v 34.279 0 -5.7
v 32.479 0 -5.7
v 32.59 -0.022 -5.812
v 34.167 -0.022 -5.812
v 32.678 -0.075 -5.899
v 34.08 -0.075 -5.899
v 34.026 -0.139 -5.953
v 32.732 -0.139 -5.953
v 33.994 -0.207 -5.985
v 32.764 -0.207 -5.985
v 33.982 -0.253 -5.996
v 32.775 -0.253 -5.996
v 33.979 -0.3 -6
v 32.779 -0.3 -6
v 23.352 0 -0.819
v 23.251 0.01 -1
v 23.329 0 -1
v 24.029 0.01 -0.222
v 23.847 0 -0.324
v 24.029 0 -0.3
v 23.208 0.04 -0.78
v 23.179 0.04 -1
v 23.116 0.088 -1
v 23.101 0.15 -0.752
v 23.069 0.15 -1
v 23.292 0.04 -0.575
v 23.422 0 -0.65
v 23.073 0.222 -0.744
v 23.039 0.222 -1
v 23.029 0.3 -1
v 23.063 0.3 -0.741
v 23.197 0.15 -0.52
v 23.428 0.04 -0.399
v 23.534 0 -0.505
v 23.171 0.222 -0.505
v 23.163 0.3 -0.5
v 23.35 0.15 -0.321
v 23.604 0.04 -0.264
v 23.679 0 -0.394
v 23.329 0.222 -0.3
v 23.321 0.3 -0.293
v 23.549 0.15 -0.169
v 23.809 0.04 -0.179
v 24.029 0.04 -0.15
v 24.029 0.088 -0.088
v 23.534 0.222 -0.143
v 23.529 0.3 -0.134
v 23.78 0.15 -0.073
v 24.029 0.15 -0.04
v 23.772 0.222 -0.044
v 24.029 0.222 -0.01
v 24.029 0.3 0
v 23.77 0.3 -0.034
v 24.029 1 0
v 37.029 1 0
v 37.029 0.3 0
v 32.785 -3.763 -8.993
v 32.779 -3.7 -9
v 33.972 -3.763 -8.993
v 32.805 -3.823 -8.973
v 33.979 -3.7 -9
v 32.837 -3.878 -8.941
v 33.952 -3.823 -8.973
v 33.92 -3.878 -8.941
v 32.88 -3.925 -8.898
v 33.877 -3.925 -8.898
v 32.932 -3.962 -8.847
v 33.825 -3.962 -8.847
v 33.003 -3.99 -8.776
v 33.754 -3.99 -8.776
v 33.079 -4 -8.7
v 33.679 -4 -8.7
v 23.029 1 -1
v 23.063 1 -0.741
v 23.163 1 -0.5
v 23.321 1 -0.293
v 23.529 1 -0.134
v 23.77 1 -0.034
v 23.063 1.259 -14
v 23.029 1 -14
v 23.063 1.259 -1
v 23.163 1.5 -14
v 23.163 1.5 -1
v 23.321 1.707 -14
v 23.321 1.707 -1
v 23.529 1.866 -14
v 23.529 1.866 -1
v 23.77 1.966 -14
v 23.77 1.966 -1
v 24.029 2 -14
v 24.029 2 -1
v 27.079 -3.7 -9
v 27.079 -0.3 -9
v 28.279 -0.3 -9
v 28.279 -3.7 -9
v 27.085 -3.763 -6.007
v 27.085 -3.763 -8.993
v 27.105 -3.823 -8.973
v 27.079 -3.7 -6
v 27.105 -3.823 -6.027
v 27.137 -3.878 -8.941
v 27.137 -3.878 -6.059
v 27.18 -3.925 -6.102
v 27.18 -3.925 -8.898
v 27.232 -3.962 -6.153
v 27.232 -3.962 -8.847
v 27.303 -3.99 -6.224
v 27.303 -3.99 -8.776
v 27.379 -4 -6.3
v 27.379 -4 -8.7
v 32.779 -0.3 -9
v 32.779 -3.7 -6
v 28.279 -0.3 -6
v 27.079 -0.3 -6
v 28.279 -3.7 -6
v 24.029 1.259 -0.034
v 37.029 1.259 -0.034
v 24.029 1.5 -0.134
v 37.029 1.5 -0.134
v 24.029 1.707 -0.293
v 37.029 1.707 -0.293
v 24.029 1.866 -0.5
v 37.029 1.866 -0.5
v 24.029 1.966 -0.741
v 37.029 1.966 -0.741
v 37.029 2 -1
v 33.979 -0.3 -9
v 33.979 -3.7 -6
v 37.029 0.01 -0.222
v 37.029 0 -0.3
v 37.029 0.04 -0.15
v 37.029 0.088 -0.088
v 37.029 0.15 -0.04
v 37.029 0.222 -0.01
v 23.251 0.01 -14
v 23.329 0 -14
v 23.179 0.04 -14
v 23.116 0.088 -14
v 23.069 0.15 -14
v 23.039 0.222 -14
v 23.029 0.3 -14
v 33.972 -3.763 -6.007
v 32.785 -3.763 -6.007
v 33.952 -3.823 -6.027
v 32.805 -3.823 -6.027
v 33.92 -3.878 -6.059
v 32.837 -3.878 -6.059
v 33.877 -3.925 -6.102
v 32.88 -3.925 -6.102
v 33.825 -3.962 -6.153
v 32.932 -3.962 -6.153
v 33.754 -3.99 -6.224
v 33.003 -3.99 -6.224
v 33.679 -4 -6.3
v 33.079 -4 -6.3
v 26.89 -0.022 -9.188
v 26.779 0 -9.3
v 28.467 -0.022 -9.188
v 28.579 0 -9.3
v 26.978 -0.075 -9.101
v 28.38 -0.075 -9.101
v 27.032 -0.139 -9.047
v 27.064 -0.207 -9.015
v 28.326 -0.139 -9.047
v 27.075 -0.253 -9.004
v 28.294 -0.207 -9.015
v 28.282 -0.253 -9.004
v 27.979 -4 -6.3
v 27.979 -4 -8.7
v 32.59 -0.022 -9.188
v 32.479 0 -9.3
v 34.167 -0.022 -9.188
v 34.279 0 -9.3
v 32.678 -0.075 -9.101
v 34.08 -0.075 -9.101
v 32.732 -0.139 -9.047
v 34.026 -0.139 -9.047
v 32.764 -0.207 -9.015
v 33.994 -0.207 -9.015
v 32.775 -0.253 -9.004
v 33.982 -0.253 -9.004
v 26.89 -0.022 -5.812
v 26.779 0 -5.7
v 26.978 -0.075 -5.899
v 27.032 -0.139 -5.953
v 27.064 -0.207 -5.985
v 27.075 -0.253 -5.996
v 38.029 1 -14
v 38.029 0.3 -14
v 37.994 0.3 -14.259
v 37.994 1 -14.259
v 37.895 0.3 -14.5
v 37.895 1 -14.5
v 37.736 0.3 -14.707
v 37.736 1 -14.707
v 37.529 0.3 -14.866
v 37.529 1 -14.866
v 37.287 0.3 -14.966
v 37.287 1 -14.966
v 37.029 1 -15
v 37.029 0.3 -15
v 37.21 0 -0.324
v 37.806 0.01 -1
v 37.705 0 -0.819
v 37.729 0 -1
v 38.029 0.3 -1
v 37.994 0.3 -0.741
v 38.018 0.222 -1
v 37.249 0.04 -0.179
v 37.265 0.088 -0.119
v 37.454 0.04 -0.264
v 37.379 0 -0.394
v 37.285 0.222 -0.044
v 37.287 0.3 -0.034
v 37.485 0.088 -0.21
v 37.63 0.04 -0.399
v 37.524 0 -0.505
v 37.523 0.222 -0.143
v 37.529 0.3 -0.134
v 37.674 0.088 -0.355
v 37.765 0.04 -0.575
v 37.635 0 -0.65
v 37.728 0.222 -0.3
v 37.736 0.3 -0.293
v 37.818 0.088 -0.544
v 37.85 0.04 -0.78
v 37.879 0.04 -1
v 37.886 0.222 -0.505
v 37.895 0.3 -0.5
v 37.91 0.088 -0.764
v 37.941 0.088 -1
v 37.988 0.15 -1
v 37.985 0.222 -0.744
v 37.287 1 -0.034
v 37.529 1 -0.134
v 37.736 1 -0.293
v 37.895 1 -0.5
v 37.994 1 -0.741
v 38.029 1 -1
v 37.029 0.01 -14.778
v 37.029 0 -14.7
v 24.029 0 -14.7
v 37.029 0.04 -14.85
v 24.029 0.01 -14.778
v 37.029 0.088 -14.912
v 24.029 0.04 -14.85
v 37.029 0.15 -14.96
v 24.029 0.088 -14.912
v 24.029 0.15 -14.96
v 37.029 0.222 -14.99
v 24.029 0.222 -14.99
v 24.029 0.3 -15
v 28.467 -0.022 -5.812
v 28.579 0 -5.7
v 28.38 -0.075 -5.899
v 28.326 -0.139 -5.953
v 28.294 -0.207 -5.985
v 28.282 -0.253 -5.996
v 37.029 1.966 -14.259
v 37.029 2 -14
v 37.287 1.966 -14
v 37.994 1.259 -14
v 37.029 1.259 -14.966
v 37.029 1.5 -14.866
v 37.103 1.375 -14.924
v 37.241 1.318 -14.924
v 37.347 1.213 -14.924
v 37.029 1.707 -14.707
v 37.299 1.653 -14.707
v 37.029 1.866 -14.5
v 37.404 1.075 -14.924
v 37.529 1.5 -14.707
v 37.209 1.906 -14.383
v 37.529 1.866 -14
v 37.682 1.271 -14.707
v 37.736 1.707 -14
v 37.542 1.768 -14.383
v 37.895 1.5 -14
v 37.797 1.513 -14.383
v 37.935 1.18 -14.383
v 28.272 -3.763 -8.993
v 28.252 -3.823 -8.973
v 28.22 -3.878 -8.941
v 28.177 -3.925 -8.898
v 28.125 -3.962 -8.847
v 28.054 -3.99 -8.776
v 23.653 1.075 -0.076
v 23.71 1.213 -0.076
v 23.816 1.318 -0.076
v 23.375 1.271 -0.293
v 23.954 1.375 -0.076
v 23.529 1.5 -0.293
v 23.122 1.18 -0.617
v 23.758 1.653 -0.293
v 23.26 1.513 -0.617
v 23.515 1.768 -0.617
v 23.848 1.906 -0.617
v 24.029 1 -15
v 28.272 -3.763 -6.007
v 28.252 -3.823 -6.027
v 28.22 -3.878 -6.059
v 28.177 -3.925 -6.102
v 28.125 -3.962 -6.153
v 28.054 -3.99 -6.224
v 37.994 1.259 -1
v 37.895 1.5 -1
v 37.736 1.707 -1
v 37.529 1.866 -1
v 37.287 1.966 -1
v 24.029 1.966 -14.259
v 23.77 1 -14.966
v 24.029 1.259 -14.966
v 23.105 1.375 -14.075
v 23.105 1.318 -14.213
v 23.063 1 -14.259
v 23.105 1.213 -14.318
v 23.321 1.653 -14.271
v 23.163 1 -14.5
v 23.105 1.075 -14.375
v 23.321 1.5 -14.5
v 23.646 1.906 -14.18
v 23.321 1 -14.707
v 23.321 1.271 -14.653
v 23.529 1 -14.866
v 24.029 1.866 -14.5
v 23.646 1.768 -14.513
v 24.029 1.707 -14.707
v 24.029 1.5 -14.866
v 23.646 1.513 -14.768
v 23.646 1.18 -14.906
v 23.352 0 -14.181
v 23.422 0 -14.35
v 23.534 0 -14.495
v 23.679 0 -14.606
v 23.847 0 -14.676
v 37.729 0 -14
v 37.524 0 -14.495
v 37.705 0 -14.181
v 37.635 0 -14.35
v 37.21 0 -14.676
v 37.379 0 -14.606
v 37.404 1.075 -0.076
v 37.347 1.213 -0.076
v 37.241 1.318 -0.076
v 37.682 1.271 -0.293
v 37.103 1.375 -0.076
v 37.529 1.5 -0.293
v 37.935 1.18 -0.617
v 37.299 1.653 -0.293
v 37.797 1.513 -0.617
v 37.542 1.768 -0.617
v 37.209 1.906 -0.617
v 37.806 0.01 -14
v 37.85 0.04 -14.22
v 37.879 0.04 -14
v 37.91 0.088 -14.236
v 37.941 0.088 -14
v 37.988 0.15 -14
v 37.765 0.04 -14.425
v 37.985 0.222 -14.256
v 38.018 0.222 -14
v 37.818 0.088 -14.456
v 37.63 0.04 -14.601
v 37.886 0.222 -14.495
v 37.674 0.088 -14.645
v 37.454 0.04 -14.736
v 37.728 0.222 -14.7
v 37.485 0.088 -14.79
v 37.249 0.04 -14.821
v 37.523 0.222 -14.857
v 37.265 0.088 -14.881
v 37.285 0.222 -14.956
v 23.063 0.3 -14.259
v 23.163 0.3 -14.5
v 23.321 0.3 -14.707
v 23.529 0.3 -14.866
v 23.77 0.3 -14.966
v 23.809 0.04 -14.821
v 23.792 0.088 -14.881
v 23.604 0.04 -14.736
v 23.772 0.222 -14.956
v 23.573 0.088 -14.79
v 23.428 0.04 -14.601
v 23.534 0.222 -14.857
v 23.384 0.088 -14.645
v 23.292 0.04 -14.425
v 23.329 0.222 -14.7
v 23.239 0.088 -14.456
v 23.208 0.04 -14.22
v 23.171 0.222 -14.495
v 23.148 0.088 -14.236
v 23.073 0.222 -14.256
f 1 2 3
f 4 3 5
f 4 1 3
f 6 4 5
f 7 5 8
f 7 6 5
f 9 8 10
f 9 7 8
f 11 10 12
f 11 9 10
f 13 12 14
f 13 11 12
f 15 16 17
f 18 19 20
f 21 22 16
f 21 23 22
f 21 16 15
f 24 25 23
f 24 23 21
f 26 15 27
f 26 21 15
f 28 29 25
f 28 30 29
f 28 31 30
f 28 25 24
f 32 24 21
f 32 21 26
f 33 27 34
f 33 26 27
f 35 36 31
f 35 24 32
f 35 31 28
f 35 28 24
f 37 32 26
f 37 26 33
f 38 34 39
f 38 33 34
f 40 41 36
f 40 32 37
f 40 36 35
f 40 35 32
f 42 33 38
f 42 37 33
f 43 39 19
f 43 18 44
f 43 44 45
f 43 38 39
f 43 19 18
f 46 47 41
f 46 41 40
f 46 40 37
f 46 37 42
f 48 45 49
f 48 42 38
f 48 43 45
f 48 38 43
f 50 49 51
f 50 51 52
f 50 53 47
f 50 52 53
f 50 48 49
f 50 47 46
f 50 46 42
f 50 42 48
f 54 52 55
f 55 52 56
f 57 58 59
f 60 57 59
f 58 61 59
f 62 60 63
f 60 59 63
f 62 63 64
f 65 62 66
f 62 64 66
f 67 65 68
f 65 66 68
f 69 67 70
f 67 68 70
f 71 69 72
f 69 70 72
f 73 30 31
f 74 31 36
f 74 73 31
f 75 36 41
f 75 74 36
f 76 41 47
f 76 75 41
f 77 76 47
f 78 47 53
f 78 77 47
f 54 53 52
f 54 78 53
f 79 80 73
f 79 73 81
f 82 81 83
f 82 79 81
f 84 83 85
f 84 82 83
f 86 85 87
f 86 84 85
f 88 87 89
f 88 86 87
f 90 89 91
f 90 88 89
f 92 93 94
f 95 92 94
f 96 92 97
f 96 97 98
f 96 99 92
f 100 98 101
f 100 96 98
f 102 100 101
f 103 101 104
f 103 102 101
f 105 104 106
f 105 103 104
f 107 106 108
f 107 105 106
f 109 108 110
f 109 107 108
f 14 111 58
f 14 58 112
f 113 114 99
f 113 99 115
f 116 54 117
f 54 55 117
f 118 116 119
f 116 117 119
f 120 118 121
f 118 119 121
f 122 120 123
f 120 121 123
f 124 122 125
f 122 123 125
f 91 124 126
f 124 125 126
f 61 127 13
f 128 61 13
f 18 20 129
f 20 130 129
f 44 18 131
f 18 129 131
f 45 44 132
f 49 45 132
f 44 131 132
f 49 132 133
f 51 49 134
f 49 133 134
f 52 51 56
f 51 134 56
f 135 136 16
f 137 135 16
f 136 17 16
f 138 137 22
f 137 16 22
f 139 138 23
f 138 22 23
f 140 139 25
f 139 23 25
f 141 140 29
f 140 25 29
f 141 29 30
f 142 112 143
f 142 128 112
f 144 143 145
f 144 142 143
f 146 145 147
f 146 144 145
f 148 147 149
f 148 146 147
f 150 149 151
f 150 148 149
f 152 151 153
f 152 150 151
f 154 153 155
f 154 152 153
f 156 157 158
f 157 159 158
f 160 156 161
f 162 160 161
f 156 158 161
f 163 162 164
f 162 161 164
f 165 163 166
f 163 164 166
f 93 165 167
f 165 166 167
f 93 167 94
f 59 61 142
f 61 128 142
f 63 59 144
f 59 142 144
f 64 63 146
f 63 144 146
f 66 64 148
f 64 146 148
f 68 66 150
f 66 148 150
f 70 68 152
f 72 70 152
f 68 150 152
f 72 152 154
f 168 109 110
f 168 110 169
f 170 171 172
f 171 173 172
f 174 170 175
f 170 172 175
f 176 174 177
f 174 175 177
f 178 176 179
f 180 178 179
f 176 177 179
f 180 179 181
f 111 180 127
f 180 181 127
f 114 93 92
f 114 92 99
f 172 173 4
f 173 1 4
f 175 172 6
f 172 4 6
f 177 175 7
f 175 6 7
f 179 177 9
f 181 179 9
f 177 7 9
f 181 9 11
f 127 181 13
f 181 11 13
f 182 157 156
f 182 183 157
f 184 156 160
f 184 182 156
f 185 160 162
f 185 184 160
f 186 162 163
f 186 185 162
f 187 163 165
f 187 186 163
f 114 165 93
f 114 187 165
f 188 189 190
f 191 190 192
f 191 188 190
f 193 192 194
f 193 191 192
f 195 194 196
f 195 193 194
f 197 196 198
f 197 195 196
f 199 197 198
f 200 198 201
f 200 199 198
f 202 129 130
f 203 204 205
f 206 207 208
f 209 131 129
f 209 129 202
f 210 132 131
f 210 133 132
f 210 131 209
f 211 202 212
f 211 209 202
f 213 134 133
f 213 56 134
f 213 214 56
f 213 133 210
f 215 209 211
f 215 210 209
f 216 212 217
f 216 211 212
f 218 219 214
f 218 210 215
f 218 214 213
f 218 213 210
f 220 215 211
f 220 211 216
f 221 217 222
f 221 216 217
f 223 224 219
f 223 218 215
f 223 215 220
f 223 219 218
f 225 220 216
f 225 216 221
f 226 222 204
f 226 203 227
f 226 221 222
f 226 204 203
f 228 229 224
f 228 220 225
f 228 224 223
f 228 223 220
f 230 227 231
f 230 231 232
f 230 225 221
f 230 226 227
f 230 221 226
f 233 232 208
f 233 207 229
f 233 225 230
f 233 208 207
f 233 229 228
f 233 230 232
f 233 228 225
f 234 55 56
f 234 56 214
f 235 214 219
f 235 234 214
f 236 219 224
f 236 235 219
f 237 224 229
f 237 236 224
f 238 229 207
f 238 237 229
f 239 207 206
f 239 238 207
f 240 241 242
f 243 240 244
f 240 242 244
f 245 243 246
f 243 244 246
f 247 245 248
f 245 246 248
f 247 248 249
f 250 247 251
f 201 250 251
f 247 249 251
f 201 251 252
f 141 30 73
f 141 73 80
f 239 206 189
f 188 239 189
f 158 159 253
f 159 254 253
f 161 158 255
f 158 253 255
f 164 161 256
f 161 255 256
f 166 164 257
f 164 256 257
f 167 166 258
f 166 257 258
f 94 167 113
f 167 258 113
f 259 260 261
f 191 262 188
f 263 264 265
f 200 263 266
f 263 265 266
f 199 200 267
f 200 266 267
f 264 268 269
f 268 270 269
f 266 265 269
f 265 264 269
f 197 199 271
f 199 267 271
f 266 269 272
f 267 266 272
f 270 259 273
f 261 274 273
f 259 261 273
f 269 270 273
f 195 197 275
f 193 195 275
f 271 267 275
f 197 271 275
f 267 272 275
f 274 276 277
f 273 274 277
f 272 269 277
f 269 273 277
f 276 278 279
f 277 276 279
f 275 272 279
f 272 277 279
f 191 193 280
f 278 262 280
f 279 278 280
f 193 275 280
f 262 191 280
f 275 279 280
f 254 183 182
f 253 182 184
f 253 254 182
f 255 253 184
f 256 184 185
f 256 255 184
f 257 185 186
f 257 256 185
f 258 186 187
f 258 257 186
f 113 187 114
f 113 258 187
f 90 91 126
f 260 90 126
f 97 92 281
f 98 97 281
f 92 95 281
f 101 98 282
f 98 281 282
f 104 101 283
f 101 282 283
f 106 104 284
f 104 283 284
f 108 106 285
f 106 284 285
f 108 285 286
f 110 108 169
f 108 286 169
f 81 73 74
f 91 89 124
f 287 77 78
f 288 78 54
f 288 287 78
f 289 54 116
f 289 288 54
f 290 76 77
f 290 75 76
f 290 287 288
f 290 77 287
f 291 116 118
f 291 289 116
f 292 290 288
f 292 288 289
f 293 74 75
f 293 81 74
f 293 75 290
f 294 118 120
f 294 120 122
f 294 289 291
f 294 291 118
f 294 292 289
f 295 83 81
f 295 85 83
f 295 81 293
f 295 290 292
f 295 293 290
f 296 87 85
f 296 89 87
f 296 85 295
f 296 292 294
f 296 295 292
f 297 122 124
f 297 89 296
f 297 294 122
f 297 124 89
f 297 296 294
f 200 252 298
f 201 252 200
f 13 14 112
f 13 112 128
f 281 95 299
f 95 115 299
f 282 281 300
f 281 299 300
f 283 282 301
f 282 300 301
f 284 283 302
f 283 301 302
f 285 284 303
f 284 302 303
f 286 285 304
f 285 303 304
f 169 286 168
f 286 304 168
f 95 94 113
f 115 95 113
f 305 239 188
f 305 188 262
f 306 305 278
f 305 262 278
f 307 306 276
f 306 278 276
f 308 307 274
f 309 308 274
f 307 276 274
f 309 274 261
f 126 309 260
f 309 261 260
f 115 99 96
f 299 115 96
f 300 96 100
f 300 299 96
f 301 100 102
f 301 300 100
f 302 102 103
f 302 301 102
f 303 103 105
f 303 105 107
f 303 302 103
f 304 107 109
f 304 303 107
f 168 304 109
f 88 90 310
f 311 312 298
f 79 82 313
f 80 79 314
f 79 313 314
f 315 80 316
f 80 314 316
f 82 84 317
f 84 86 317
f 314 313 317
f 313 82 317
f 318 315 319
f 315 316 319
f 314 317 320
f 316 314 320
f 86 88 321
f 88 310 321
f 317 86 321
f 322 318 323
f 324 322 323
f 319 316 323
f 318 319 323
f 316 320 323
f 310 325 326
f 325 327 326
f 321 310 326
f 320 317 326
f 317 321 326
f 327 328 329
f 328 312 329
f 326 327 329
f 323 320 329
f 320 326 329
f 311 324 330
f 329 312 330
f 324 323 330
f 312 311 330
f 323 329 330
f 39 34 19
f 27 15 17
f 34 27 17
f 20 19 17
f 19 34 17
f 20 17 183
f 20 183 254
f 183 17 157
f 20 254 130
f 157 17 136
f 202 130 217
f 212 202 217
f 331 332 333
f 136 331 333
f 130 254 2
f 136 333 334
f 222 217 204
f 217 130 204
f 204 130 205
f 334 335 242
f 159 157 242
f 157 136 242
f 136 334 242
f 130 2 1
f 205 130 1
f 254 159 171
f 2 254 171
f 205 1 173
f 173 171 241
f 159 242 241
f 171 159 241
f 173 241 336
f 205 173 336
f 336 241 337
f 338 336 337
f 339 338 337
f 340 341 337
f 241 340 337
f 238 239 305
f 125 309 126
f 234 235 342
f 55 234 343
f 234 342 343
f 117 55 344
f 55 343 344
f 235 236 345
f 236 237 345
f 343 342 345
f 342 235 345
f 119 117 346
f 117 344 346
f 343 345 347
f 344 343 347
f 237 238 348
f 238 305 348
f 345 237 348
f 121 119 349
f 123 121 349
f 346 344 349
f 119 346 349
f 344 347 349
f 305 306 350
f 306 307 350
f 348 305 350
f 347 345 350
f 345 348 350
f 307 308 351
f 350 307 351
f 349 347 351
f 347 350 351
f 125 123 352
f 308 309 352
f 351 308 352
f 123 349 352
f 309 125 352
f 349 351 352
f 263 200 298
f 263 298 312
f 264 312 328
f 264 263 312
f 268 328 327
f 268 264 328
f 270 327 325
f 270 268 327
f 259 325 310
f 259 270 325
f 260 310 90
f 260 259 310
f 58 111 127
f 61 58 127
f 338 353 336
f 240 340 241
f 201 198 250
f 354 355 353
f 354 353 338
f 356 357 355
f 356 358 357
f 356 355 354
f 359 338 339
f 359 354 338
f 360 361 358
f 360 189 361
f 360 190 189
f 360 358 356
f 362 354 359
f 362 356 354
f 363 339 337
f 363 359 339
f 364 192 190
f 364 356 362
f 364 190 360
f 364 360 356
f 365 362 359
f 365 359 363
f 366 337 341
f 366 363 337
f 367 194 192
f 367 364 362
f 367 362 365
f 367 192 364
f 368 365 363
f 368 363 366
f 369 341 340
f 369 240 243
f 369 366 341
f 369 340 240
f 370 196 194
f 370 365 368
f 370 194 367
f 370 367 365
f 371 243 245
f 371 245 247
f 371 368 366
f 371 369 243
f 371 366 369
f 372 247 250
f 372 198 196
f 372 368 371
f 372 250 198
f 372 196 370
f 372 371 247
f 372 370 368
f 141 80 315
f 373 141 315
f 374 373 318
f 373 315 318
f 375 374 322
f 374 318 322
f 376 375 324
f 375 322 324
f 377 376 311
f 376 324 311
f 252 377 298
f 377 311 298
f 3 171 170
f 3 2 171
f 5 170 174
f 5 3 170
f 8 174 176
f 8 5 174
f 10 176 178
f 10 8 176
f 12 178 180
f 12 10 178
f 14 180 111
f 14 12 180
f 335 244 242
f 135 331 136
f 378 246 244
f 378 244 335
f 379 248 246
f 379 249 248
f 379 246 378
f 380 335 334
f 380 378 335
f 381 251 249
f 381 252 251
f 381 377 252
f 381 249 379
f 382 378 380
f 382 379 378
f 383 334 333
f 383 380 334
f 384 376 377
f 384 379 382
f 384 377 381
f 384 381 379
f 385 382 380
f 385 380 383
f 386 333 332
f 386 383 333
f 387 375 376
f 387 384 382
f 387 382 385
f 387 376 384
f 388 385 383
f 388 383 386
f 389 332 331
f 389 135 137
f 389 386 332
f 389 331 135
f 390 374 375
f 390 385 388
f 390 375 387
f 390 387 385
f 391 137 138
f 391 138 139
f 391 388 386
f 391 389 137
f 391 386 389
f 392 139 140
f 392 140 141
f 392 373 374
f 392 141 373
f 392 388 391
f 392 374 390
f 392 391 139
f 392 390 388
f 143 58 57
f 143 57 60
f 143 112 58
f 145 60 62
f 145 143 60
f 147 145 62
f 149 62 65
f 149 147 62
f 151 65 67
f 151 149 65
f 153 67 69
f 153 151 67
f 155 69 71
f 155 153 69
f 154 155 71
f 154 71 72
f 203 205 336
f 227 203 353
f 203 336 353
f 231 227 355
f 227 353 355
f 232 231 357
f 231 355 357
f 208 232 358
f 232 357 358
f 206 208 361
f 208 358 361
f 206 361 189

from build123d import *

# Parameters (mm, degrees)
SKETCH_1_W      = 15
SKETCH_1_H      = 15
EXTRUDE_1_DEPTH = 2
FILLET_1_R      = 1
SKETCH_2_W      = 1.2
SKETCH_2_H      = 3
EXTRUDE_2_DEPTH = 4
FILLET_2_R      = 0.3


with BuildPart() as part:
    # 草图1 → 凸台-拉伸1 (new body)
    with BuildSketch(Plane(origin=(0, 0, 0), x_dir=(1, 0, 0), z_dir=(0, 1, 0))):
        with Locations((30.528568239, 7.5)):
            Rectangle(SKETCH_1_W, SKETCH_1_H)
    extrude(amount=EXTRUDE_1_DEPTH)

    # 圆角1
    fillet_1_edges = [part.edges().sort_by_distance(p)[0] for p in [
        (38.028568239, 2, -7.5),
        (30.528568239, 2, -15),
        (23.028568239, 2, -7.5),
        (23.028568239, 1, -15),
        (38.028568239, 1, -15),
        (38.028568239, 1, 0),
        (23.028568239, 1, 0),
        (30.528568239, 2, 0),
    ]]
    fillet(fillet_1_edges, radius=FILLET_1_R)

    # 草图2 → 凸台-拉伸2 (add)
    with BuildSketch(Plane.XZ):
        with Locations((33.378568239, -7.5)):
            Rectangle(SKETCH_2_W, SKETCH_2_H)
        with Locations((27.678568239, -7.5)):
            Rectangle(SKETCH_2_W, SKETCH_2_H)
    extrude(amount=EXTRUDE_2_DEPTH)

    # 圆角2
    fillet_2_edges = [part.edges().sort_by_distance(p)[0] for p in [
        (30.528568239, 0, 0),
        (38.028568239, 0, -7.5),
        (23.028568239, 0, -7.5),
        (30.528568239, 0, -15),
        (23.321461458, 0, -0.292893219),
        (37.73567502, 0, -0.292893219),
        (23.321461458, 0, -14.707106781),
        (37.73567502, 0, -14.707106781),
        (28.278568239, 0, -7.5),
        (27.678568239, 0, -6),
        (27.078568239, 0, -7.5),
        (27.678568239, 0, -9),
        (28.278568239, -4, -7.5),
        (27.678568239, -4, -6),
        (27.078568239, -4, -7.5),
        (27.678568239, -4, -9),
        (33.978568239, 0, -7.5),
        (33.378568239, 0, -6),
        (32.778568239, 0, -7.5),
        (33.378568239, 0, -9),
        (33.978568239, -4, -7.5),
        (33.378568239, -4, -6),
        (32.778568239, -4, -7.5),
        (33.378568239, -4, -9),
    ]]
    fillet(fillet_2_edges, radius=FILLET_2_R)


solid = part.part
